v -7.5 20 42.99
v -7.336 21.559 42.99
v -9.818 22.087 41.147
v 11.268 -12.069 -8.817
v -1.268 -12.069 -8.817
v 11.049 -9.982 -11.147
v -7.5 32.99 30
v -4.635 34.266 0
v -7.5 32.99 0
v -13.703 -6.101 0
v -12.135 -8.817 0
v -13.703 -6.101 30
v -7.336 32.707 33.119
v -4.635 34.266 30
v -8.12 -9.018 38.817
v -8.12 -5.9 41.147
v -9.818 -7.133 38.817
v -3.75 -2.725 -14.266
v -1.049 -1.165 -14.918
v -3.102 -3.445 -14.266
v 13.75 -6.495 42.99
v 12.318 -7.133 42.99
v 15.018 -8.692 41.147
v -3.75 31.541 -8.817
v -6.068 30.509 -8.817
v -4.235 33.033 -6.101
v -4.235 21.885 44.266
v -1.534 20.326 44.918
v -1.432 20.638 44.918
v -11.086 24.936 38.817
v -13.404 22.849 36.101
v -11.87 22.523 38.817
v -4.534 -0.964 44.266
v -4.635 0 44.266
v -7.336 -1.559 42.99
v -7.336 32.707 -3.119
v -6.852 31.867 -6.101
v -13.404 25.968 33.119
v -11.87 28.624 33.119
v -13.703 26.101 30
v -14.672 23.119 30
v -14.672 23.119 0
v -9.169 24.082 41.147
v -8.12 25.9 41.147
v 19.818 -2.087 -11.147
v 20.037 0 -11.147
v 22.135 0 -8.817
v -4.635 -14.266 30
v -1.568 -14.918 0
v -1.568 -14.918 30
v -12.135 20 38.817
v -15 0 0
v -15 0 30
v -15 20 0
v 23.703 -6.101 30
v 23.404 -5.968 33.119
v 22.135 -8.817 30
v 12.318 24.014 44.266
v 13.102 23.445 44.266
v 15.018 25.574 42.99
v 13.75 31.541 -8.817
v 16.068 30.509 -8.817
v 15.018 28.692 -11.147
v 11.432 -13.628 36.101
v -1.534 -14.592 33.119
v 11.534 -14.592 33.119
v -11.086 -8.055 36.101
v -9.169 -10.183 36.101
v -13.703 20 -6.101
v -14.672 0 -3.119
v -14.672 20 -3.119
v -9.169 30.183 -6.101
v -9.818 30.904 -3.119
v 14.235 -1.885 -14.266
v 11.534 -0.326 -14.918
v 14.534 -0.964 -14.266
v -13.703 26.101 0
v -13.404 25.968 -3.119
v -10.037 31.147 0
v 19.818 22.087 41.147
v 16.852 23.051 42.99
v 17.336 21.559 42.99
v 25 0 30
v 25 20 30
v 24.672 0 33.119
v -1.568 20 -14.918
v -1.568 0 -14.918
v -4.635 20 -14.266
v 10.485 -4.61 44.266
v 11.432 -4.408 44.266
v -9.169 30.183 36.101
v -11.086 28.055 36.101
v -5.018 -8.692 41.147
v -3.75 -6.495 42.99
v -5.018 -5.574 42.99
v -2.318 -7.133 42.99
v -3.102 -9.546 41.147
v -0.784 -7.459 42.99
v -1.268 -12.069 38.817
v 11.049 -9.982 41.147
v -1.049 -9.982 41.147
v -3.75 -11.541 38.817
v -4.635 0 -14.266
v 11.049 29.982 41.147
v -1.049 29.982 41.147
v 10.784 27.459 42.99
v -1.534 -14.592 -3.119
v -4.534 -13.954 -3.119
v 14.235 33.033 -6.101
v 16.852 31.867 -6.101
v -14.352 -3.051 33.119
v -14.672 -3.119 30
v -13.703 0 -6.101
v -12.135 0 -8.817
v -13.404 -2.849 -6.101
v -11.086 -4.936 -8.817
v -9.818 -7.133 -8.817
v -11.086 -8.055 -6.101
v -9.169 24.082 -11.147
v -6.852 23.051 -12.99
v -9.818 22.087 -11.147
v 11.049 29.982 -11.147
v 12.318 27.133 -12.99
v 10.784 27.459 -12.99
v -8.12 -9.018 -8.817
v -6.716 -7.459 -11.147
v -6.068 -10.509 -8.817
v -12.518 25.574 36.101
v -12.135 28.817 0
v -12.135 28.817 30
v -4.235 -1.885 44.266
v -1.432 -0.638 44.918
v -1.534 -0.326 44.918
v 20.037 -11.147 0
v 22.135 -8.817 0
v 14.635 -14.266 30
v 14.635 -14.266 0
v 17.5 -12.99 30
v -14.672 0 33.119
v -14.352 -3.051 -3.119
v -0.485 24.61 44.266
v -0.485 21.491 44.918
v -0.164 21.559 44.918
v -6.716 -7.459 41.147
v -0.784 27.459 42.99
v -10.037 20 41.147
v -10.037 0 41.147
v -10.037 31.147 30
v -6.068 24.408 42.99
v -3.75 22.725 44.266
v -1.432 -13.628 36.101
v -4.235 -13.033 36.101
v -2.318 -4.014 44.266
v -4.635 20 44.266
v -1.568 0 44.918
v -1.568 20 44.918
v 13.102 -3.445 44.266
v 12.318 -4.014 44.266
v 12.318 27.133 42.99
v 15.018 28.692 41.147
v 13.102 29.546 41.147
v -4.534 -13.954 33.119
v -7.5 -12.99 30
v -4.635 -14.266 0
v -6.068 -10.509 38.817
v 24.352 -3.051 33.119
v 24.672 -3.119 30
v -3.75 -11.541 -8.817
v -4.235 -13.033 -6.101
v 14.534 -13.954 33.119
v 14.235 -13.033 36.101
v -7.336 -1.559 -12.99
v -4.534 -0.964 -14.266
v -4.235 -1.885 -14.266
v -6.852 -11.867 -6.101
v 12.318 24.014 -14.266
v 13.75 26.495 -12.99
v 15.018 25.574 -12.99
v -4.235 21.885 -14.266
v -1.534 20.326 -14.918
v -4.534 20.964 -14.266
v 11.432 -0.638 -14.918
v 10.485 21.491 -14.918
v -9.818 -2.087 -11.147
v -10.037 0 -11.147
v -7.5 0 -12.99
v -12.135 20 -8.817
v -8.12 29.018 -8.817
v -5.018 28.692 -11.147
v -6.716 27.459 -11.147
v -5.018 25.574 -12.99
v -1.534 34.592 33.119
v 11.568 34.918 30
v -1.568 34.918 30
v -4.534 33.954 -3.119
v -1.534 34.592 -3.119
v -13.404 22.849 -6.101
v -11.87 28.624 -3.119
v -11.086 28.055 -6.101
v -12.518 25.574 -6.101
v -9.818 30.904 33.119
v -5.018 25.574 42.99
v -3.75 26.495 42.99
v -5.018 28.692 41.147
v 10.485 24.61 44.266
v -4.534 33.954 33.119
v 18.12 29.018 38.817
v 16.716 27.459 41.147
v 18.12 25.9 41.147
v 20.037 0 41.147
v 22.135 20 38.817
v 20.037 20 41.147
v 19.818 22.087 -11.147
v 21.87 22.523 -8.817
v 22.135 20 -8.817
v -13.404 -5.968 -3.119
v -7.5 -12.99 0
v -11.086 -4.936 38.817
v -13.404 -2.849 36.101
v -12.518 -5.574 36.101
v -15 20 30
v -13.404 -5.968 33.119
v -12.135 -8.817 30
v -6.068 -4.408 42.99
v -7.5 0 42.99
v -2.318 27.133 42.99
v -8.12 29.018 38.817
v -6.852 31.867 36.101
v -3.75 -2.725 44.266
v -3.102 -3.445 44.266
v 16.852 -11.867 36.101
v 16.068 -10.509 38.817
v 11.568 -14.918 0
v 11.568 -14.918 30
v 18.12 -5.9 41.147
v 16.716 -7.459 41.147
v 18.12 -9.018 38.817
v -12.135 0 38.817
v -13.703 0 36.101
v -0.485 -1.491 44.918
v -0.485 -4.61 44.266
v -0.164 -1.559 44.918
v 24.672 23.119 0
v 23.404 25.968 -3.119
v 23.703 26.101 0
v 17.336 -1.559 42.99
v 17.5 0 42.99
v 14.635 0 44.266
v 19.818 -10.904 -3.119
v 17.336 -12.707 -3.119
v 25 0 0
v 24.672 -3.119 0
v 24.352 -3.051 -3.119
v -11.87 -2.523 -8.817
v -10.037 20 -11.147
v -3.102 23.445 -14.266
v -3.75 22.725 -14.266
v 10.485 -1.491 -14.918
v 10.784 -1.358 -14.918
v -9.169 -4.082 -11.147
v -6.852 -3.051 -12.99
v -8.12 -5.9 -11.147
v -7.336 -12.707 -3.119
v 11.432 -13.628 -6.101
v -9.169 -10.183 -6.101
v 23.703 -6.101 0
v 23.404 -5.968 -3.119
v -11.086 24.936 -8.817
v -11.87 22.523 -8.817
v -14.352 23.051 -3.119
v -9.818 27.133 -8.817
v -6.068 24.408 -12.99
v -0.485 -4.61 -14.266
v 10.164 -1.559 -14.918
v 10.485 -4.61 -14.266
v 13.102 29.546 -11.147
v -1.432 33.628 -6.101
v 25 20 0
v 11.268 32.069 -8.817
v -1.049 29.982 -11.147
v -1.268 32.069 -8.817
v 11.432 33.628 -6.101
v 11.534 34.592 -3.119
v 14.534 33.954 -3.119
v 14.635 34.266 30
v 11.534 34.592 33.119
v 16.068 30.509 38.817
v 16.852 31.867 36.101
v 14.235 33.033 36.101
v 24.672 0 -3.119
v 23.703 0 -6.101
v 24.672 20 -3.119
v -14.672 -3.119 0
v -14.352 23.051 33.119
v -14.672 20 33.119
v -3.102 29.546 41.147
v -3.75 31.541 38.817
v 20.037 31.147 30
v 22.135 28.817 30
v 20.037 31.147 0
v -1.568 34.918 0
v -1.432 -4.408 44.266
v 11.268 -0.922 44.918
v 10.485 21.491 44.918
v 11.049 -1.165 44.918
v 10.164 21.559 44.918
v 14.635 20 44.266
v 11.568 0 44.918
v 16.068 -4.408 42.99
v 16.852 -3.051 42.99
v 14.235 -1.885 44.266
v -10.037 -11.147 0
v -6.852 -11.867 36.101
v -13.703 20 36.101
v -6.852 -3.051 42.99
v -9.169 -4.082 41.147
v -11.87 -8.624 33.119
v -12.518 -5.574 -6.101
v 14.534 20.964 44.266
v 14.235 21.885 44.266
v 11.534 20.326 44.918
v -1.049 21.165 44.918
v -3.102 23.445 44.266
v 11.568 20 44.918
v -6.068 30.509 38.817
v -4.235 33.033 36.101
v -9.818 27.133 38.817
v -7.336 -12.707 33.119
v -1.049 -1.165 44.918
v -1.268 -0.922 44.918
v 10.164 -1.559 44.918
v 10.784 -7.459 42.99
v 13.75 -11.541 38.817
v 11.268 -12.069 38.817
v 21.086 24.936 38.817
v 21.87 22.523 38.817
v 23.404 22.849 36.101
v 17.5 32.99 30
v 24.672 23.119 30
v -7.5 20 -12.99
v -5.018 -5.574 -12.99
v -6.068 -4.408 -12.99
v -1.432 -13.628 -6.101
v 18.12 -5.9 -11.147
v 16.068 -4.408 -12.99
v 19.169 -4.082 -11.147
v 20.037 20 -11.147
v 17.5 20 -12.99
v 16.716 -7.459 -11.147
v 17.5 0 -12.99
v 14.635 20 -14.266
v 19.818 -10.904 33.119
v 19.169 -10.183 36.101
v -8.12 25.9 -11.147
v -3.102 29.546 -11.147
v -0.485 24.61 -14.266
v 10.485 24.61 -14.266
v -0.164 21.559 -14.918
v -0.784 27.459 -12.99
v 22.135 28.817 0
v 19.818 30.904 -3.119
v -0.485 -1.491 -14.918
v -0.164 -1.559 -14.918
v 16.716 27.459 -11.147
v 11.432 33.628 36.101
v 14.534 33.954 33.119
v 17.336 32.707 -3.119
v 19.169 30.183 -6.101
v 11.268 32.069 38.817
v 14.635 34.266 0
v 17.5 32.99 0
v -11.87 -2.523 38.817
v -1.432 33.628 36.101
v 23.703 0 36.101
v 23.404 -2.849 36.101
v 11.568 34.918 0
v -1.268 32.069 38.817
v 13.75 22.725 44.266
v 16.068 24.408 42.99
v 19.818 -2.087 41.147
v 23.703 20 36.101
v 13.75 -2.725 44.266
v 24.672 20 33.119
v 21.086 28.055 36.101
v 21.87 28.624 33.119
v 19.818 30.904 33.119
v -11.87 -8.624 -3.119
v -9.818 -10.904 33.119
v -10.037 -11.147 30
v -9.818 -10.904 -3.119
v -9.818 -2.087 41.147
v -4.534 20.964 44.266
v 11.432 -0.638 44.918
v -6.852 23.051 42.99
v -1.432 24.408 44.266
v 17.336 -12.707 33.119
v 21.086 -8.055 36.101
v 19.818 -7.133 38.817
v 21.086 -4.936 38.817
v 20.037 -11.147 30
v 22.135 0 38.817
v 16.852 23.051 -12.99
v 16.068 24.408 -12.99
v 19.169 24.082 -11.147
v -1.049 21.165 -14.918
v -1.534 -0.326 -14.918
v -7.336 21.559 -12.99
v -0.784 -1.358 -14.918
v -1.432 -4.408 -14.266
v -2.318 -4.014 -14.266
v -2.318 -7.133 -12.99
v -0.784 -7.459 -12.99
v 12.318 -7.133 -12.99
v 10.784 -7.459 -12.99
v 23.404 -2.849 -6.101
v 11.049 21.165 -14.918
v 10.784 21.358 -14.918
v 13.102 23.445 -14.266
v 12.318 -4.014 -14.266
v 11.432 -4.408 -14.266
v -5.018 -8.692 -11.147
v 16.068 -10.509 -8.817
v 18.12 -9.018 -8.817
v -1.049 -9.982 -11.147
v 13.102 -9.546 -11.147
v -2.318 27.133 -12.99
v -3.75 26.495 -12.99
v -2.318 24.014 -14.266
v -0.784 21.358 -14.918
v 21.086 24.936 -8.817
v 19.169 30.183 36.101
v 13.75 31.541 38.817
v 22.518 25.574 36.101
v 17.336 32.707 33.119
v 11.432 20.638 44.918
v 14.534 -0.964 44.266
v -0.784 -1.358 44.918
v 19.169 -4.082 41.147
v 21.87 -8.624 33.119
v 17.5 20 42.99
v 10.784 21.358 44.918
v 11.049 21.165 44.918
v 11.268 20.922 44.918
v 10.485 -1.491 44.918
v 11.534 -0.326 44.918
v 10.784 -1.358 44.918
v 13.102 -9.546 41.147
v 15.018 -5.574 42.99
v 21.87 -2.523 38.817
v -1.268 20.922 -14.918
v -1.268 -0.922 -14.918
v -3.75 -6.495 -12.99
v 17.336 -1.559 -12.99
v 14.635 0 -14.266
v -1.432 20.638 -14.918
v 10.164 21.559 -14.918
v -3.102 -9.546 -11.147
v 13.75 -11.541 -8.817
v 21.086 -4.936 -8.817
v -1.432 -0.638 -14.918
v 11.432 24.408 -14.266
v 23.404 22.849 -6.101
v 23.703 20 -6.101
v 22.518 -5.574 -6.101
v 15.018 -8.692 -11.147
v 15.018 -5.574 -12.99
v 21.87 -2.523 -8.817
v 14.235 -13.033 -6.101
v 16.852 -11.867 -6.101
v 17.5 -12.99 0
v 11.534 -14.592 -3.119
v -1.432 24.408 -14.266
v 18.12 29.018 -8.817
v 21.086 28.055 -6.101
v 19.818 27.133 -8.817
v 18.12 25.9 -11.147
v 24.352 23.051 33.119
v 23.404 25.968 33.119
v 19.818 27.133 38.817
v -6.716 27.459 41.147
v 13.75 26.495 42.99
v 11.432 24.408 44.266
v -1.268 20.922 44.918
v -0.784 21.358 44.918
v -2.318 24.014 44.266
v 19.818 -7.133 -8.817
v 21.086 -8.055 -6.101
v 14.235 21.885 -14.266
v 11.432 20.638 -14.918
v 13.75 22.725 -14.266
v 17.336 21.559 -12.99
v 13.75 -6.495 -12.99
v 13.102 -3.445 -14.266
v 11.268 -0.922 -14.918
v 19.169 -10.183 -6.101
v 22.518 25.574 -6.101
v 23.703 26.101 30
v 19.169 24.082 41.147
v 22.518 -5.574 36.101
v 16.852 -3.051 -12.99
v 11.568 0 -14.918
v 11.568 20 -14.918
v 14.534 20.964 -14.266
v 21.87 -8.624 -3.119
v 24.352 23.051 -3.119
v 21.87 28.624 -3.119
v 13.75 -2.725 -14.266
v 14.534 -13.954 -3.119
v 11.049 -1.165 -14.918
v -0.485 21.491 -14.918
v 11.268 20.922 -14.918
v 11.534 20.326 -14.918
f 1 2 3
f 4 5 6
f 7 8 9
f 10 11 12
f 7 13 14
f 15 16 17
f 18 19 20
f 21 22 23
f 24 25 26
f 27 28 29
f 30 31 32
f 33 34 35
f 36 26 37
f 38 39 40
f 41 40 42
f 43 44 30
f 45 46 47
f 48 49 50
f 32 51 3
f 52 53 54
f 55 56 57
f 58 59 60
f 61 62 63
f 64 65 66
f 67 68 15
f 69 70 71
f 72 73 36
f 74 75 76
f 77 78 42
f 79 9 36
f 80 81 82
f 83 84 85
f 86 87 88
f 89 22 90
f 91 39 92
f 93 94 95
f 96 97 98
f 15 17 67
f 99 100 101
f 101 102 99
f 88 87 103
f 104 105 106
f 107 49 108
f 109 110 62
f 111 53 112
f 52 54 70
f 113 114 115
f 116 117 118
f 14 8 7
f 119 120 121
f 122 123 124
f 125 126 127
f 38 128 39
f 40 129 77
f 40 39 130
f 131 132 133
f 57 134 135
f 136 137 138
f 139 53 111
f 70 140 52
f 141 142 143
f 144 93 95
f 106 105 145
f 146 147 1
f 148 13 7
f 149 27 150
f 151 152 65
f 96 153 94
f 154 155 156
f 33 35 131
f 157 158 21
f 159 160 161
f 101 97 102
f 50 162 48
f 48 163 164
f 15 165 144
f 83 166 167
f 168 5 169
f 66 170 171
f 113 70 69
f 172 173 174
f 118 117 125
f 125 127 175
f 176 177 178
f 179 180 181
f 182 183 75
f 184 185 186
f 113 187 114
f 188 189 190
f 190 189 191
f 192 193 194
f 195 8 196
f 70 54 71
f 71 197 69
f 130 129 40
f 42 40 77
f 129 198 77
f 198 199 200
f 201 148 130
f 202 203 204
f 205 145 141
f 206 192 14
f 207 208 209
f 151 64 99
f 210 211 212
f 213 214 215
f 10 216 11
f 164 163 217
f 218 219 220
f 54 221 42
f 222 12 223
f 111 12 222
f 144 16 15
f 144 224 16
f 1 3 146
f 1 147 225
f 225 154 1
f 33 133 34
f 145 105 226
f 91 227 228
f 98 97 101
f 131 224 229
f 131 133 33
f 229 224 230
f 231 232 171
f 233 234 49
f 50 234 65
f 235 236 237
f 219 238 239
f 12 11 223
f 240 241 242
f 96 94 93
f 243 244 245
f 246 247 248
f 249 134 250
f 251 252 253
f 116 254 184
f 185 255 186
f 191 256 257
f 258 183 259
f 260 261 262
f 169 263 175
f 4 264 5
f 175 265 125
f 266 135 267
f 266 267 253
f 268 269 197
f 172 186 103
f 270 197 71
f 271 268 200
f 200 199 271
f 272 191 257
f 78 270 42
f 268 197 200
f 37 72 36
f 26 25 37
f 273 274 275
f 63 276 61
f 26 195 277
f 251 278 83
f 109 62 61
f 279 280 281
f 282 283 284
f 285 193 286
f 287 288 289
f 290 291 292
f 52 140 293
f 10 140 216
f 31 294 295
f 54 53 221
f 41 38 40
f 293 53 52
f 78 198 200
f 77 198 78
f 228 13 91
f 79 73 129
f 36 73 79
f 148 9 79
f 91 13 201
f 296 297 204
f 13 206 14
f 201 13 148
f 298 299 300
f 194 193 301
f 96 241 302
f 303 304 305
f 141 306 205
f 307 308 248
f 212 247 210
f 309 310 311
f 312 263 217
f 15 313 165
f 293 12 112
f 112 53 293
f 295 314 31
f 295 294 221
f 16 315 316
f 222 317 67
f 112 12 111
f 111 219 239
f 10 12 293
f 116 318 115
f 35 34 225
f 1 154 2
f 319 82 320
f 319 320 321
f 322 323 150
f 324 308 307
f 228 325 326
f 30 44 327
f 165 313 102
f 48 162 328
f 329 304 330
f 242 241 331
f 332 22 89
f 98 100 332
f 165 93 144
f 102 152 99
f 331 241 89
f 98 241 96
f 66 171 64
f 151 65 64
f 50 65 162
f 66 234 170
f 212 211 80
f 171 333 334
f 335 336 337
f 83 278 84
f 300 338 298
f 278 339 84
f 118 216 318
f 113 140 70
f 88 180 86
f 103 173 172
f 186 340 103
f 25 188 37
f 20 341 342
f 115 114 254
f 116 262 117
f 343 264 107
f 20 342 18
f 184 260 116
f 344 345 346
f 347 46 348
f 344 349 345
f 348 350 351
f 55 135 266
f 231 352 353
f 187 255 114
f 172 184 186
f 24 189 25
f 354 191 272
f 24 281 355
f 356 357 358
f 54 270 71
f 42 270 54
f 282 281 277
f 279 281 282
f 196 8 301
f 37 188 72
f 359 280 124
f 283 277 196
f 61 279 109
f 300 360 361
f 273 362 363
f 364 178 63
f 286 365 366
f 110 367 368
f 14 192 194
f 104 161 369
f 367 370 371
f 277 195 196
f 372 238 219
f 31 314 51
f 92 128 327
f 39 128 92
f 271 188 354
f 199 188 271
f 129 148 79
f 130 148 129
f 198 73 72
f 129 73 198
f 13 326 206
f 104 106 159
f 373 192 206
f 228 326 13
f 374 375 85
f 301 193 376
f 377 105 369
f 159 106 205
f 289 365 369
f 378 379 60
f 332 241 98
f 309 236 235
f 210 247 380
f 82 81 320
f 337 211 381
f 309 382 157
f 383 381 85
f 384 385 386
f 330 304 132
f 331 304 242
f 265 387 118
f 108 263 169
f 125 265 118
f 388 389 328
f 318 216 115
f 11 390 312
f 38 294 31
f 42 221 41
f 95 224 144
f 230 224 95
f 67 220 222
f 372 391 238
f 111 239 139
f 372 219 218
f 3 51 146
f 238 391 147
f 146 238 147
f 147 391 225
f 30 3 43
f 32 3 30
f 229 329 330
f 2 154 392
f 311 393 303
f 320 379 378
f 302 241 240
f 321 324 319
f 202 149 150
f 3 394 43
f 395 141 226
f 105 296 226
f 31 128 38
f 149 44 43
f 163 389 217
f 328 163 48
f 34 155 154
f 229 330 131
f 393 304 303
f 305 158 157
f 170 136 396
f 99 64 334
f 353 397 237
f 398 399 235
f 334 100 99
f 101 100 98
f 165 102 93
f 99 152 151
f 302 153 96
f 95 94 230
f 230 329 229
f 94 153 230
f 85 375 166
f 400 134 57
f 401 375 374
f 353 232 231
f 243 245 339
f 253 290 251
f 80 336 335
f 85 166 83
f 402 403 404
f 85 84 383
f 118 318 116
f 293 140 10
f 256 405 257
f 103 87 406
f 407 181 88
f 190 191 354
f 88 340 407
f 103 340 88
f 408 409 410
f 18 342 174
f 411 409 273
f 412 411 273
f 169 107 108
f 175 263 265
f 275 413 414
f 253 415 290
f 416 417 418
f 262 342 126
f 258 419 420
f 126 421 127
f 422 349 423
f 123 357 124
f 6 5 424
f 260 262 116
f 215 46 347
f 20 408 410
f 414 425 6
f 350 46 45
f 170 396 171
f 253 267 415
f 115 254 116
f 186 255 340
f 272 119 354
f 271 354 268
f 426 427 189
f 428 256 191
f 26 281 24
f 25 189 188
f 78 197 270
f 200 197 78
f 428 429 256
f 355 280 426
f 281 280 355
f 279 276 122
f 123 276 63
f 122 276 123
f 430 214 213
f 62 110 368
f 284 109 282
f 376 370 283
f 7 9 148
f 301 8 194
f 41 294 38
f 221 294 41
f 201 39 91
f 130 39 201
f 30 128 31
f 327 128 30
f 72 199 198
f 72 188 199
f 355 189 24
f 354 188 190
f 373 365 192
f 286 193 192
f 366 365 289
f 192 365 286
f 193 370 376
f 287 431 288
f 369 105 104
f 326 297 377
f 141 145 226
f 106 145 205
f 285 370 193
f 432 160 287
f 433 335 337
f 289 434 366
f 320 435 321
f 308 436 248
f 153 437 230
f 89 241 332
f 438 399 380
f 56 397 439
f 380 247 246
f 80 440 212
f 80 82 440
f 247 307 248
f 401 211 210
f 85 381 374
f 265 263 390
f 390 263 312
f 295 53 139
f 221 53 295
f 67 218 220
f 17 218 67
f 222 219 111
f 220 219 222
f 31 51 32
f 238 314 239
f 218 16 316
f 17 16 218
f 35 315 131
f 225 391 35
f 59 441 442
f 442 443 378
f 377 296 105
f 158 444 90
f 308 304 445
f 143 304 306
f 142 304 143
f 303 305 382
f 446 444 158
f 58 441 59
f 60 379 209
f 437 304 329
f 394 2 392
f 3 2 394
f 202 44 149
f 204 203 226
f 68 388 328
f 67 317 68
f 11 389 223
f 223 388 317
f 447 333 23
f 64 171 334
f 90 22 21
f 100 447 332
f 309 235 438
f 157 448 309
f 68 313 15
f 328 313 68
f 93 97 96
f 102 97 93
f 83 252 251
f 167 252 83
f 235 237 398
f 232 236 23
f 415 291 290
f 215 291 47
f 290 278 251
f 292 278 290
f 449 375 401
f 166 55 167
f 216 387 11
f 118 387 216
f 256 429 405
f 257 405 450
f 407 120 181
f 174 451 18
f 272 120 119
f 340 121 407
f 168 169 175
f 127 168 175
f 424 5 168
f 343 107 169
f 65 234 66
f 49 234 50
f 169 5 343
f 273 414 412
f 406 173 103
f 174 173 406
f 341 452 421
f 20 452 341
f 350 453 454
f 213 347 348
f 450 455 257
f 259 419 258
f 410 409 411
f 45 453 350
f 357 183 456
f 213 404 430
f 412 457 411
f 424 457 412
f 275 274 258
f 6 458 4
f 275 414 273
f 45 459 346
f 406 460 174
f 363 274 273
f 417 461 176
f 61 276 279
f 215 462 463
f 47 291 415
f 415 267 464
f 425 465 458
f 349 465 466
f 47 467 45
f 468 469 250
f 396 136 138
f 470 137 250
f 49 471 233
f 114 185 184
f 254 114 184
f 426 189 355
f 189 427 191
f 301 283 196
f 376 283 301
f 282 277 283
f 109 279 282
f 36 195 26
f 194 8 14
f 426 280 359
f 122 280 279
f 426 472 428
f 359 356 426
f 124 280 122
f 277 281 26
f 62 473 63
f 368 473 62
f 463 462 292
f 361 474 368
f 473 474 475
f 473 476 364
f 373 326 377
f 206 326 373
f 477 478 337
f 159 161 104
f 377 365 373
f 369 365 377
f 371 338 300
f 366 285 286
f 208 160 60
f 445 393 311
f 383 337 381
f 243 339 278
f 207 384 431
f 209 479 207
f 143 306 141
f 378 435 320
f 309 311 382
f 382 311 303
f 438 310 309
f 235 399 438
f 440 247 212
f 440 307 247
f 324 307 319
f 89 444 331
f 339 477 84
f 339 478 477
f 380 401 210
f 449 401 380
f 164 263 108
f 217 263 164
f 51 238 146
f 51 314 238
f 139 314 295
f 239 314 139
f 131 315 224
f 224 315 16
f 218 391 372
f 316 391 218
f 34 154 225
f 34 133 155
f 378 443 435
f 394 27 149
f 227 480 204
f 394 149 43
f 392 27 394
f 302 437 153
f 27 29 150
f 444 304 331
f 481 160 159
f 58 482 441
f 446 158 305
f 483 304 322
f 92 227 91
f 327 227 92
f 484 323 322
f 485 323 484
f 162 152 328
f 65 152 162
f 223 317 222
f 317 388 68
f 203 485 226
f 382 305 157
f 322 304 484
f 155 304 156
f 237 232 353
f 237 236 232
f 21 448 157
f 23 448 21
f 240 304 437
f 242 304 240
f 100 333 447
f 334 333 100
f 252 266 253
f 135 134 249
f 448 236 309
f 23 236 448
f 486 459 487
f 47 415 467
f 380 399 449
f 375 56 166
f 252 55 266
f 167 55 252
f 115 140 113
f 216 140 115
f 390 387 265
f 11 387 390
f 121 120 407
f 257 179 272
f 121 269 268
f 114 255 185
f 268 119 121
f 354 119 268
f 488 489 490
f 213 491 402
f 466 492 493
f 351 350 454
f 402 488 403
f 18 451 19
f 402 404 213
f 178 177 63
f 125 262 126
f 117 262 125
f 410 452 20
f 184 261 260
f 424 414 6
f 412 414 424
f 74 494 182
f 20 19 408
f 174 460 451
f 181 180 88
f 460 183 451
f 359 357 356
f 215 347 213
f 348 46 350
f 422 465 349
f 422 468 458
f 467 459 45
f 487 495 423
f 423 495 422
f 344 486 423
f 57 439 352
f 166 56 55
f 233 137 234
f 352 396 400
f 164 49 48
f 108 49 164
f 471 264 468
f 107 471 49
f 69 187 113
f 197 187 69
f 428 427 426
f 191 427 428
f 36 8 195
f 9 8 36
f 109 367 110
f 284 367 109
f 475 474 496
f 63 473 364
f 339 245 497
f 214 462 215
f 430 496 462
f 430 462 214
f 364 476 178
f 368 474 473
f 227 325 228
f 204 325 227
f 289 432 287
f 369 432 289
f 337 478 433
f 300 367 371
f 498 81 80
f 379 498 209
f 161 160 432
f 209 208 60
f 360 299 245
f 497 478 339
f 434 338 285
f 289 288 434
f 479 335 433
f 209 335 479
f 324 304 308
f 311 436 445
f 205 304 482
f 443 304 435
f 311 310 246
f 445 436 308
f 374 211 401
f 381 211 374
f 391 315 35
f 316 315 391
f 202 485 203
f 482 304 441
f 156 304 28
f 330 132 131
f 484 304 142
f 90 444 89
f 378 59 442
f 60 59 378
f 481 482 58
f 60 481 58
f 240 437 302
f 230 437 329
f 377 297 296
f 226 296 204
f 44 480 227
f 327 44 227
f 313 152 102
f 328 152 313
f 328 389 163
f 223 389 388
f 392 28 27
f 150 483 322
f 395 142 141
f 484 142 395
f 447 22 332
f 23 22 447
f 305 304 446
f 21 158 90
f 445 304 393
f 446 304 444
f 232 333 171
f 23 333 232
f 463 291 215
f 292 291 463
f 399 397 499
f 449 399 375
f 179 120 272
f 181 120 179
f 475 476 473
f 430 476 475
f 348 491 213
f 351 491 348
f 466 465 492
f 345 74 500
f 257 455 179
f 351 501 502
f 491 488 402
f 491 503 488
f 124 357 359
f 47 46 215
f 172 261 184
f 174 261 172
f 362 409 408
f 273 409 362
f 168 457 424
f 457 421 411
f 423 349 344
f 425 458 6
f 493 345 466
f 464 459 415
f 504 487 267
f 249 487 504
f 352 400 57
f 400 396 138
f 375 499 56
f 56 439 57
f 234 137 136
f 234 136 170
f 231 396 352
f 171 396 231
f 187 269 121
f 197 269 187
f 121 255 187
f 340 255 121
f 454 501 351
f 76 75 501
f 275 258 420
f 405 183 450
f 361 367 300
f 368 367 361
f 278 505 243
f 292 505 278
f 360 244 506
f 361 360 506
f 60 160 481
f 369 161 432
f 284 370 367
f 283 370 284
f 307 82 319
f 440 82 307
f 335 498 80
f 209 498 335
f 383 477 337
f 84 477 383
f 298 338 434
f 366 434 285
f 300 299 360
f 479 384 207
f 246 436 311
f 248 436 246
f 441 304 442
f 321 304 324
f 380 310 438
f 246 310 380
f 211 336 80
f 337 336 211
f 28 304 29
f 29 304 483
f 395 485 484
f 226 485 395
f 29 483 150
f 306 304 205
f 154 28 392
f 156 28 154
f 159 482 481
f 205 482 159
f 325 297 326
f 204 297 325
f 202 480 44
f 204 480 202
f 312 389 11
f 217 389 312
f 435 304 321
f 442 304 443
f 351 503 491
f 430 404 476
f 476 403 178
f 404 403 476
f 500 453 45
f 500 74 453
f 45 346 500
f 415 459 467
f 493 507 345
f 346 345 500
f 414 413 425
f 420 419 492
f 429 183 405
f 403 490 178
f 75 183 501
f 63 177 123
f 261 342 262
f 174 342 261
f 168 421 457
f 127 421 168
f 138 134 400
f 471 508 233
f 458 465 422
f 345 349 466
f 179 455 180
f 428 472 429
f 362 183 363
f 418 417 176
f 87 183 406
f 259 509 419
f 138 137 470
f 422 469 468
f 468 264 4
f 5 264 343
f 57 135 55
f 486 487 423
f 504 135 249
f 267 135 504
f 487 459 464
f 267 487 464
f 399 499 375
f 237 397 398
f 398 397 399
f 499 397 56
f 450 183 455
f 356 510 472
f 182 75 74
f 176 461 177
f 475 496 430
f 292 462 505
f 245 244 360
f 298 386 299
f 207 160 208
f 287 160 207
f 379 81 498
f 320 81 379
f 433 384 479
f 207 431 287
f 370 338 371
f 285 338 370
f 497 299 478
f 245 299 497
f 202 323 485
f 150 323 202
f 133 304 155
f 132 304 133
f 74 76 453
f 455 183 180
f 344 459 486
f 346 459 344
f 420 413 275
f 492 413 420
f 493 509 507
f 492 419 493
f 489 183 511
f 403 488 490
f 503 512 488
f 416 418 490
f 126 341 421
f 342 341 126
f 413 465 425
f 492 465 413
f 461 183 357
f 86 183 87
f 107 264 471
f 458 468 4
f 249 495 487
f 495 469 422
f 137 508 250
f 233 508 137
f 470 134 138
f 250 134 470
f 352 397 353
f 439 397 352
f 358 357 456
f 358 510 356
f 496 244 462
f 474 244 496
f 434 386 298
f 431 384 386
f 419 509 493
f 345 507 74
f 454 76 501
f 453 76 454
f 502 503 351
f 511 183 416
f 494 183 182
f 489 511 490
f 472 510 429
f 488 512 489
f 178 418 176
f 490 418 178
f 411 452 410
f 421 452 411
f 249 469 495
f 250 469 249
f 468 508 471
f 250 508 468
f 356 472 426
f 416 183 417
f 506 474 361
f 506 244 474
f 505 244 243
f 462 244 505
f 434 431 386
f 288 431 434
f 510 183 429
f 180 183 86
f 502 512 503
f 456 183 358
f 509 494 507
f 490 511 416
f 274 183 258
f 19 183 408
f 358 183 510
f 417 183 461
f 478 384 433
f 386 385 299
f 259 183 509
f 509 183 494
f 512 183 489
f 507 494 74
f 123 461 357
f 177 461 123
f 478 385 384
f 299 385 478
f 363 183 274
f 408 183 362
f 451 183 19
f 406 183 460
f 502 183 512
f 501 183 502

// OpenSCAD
roundcube(size_x=10, size_y=20, size_z=30, r=15);

module roundcube(size_x, size_y, size_z, r) {
  hull() {
    translate([0, 0, 0]) sphere(r);
    translate([size_x, 0, 0]) sphere(r);
    translate([size_x, size_y, 0]) sphere(r);
    translate([0, size_y, 0]) sphere(r);
    translate([0, 0, size_z]) sphere(r);
    translate([size_x, 0, size_z]) sphere(r);
    translate([size_x, size_y, size_z]) sphere(r);
    translate([0, size_y, size_z]) sphere(r);
  }
}
